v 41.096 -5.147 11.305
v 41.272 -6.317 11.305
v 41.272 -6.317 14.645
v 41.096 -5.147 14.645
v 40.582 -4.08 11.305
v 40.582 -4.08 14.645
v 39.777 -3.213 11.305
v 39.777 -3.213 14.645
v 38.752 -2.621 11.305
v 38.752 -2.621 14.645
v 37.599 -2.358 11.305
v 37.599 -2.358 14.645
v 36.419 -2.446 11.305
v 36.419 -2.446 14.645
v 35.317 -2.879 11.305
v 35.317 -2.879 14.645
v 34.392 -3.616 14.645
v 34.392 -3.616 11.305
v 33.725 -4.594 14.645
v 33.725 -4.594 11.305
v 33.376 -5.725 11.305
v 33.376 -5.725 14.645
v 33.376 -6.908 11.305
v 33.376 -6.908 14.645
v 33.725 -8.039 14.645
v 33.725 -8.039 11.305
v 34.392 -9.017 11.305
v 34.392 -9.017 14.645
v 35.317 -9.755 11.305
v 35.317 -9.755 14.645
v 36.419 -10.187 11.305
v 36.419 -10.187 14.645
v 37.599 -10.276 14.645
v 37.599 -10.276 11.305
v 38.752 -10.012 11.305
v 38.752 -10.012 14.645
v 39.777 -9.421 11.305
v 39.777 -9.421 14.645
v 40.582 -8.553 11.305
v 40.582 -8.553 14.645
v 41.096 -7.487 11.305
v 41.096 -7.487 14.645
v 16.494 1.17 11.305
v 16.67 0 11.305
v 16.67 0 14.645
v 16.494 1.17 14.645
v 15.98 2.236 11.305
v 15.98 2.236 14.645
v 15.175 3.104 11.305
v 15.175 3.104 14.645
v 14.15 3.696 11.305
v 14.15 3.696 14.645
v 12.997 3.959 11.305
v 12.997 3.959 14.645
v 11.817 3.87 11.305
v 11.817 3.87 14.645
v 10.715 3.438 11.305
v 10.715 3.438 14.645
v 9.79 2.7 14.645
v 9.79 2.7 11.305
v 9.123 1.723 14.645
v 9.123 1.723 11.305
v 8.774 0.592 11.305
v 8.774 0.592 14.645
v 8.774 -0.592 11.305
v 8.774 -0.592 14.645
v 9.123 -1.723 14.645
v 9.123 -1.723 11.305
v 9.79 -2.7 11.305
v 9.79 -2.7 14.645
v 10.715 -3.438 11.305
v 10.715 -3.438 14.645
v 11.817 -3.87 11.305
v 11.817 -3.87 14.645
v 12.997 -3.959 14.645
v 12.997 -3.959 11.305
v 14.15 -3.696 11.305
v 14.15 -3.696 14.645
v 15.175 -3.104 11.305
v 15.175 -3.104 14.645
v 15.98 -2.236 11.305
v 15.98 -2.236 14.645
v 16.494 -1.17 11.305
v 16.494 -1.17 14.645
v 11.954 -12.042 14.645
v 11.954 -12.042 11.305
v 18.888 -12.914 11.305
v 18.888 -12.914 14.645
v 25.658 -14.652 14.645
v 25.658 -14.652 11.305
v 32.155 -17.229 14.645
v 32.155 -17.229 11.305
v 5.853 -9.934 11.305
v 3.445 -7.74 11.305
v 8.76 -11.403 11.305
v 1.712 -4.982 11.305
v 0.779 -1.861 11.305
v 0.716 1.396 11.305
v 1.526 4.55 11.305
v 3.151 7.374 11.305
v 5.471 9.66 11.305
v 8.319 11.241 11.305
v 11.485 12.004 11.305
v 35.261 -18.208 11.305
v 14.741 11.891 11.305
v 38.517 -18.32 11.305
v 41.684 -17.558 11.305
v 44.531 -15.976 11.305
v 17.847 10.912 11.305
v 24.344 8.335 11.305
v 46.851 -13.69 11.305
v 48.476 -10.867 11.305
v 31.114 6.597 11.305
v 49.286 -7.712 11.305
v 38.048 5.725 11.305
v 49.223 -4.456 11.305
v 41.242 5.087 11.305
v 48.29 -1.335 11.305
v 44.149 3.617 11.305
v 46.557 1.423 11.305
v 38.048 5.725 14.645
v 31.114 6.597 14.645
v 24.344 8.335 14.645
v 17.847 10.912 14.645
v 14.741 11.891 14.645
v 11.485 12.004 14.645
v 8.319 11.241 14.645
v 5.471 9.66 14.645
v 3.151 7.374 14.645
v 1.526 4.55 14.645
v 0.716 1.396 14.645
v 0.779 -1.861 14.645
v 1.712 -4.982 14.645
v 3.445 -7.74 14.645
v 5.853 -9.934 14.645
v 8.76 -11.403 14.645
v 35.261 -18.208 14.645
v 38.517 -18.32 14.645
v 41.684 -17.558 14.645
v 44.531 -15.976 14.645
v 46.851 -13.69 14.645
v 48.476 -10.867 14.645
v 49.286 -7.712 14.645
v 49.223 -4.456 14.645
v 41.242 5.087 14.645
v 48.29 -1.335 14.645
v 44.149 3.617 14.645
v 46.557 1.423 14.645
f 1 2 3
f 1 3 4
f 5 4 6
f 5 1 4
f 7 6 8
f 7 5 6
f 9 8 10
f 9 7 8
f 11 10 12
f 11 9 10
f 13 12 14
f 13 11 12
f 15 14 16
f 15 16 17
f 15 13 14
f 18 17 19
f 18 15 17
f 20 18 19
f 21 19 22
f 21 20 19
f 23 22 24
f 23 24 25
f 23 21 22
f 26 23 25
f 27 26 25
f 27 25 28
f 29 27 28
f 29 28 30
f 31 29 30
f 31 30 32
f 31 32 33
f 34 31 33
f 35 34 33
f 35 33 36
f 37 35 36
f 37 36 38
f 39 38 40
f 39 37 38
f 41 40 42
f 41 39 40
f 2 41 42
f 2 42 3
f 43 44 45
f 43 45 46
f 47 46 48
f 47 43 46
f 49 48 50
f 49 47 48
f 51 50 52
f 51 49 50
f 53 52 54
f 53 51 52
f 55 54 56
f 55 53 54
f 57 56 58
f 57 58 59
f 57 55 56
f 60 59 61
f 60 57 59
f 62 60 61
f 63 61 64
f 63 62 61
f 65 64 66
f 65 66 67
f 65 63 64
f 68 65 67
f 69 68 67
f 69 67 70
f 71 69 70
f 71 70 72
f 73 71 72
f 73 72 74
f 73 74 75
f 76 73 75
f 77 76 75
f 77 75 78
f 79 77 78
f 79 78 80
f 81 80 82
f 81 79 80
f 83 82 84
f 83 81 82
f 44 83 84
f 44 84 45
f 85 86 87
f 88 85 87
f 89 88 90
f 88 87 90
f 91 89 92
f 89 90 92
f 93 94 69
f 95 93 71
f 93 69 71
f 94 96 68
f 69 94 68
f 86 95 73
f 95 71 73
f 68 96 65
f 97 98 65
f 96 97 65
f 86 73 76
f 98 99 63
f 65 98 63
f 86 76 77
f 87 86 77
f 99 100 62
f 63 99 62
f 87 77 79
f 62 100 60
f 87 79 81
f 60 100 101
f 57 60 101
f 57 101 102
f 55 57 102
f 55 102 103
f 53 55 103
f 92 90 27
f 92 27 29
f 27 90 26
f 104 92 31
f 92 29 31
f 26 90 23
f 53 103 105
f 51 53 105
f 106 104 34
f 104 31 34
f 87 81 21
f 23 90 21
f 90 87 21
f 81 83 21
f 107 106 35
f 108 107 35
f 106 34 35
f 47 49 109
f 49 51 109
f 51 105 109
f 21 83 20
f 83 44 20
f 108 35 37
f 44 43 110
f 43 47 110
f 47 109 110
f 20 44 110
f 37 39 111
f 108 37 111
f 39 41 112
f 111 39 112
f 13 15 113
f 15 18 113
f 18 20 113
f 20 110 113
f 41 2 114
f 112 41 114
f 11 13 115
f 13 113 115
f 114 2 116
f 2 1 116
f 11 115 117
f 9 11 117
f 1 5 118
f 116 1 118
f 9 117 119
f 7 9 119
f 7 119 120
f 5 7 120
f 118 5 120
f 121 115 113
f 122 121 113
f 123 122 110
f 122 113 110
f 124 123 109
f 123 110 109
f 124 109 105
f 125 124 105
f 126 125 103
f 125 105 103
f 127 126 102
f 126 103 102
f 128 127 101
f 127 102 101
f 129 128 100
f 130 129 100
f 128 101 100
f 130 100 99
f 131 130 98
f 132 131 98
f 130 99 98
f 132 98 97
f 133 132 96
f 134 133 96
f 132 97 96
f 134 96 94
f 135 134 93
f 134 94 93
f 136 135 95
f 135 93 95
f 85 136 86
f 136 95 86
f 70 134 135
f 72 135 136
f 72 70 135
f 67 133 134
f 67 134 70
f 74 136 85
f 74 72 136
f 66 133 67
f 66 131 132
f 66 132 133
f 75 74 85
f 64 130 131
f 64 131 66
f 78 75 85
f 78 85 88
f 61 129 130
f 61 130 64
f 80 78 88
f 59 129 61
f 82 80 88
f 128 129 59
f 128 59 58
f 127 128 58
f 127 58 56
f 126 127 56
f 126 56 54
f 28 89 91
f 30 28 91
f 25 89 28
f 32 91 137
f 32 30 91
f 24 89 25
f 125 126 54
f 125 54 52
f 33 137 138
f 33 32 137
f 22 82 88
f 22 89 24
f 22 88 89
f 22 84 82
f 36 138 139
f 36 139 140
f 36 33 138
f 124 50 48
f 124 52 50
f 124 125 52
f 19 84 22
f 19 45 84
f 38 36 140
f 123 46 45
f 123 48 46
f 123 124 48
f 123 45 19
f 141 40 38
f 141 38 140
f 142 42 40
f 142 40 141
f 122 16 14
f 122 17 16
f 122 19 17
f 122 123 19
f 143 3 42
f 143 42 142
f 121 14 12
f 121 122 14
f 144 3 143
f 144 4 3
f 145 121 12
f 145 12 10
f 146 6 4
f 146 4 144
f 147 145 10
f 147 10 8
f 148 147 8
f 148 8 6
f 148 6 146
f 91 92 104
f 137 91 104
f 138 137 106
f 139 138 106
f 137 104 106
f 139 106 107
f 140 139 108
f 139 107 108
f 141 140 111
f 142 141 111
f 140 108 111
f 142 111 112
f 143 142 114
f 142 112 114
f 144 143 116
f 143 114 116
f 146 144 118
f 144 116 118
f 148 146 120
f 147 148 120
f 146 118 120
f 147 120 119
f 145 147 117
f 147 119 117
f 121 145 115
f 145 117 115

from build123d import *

# Parameters (mm, degrees)
SKETCH_2_R        = 7.94
EXTRUDE_1_DEPTH   = 7.875
EXTRUDE_1_2_DEPTH = 7.875
EXTRUDE_2_DEPTH   = 3.43
SKETCH_6_R        = 3.97
EXTRUDE_4_DEPTH   = 3.34


with BuildPart() as part:
    # 草图2 → 拉伸1 (new, symmetric)
    with BuildSketch(Plane.XY):
        with Locations((12.7, 0)):
            Circle(SKETCH_2_R)
    extrude(amount=EXTRUDE_1_DEPTH, both=True)



with BuildPart() as body_2:
    # 草图2 → Extrude 1 2 (new, symmetric)
    with BuildSketch(Plane.XY):
        with Locations((-12.7, 0)):
            Circle(SKETCH_2_R)
    extrude(amount=EXTRUDE_1_2_DEPTH, both=True)


with BuildPart() as part_1:
    add(part.part)

    add(body_2.part)  # 拉伸2 merges body 2
    # 草图3 → 拉伸2 (add)
    with BuildSketch(Plane.XY.offset(7.875)):
        with BuildLine():
            ThreePointArc((-10.428153415, 11.849174574), (-24.765, 0), (-10.428153415, -11.849174574))
            ThreePointArc((-10.428153415, -11.849174574), (0, -10.8585), (10.428153415, -11.849174574))
            ThreePointArc((10.428153415, -11.849174574), (24.765, 0), (10.428153415, 11.849174574))
            ThreePointArc((10.428153415, 11.849174574), (0, 10.8585), (-10.428153415, 11.849174574))
        make_face()
    extrude(amount=EXTRUDE_2_DEPTH)


with BuildPart() as body_2_2:
    # 草图6 → 拉伸4 (new body)
    with BuildSketch(Plane.XY.offset(11.305)):
        with BuildLine():
            ThreePointArc((32.154770058, -17.228648829), (48.987968132, -9.317166623), (38.048309834, 5.725173103))
            ThreePointArc((38.048309834, 5.725173103), (27.701405286, 7.358998688), (17.847242234, 10.911925695))
            ThreePointArc((17.847242234, 10.911925695), (1.014044161, 3.000443489), (11.953702459, -12.041896237))
            ThreePointArc((11.953702459, -12.041896237), (22.300607007, -13.675721822), (32.154770058, -17.228648829))
        make_face()
        with Locations((12.7, 0)):
            Circle(SKETCH_6_R, mode=Mode.SUBTRACT)
        with Locations((37.302012293, -6.316723134)):
            Circle(SKETCH_6_R, mode=Mode.SUBTRACT)
    extrude(amount=EXTRUDE_4_DEPTH)


solid = body_2_2.part
